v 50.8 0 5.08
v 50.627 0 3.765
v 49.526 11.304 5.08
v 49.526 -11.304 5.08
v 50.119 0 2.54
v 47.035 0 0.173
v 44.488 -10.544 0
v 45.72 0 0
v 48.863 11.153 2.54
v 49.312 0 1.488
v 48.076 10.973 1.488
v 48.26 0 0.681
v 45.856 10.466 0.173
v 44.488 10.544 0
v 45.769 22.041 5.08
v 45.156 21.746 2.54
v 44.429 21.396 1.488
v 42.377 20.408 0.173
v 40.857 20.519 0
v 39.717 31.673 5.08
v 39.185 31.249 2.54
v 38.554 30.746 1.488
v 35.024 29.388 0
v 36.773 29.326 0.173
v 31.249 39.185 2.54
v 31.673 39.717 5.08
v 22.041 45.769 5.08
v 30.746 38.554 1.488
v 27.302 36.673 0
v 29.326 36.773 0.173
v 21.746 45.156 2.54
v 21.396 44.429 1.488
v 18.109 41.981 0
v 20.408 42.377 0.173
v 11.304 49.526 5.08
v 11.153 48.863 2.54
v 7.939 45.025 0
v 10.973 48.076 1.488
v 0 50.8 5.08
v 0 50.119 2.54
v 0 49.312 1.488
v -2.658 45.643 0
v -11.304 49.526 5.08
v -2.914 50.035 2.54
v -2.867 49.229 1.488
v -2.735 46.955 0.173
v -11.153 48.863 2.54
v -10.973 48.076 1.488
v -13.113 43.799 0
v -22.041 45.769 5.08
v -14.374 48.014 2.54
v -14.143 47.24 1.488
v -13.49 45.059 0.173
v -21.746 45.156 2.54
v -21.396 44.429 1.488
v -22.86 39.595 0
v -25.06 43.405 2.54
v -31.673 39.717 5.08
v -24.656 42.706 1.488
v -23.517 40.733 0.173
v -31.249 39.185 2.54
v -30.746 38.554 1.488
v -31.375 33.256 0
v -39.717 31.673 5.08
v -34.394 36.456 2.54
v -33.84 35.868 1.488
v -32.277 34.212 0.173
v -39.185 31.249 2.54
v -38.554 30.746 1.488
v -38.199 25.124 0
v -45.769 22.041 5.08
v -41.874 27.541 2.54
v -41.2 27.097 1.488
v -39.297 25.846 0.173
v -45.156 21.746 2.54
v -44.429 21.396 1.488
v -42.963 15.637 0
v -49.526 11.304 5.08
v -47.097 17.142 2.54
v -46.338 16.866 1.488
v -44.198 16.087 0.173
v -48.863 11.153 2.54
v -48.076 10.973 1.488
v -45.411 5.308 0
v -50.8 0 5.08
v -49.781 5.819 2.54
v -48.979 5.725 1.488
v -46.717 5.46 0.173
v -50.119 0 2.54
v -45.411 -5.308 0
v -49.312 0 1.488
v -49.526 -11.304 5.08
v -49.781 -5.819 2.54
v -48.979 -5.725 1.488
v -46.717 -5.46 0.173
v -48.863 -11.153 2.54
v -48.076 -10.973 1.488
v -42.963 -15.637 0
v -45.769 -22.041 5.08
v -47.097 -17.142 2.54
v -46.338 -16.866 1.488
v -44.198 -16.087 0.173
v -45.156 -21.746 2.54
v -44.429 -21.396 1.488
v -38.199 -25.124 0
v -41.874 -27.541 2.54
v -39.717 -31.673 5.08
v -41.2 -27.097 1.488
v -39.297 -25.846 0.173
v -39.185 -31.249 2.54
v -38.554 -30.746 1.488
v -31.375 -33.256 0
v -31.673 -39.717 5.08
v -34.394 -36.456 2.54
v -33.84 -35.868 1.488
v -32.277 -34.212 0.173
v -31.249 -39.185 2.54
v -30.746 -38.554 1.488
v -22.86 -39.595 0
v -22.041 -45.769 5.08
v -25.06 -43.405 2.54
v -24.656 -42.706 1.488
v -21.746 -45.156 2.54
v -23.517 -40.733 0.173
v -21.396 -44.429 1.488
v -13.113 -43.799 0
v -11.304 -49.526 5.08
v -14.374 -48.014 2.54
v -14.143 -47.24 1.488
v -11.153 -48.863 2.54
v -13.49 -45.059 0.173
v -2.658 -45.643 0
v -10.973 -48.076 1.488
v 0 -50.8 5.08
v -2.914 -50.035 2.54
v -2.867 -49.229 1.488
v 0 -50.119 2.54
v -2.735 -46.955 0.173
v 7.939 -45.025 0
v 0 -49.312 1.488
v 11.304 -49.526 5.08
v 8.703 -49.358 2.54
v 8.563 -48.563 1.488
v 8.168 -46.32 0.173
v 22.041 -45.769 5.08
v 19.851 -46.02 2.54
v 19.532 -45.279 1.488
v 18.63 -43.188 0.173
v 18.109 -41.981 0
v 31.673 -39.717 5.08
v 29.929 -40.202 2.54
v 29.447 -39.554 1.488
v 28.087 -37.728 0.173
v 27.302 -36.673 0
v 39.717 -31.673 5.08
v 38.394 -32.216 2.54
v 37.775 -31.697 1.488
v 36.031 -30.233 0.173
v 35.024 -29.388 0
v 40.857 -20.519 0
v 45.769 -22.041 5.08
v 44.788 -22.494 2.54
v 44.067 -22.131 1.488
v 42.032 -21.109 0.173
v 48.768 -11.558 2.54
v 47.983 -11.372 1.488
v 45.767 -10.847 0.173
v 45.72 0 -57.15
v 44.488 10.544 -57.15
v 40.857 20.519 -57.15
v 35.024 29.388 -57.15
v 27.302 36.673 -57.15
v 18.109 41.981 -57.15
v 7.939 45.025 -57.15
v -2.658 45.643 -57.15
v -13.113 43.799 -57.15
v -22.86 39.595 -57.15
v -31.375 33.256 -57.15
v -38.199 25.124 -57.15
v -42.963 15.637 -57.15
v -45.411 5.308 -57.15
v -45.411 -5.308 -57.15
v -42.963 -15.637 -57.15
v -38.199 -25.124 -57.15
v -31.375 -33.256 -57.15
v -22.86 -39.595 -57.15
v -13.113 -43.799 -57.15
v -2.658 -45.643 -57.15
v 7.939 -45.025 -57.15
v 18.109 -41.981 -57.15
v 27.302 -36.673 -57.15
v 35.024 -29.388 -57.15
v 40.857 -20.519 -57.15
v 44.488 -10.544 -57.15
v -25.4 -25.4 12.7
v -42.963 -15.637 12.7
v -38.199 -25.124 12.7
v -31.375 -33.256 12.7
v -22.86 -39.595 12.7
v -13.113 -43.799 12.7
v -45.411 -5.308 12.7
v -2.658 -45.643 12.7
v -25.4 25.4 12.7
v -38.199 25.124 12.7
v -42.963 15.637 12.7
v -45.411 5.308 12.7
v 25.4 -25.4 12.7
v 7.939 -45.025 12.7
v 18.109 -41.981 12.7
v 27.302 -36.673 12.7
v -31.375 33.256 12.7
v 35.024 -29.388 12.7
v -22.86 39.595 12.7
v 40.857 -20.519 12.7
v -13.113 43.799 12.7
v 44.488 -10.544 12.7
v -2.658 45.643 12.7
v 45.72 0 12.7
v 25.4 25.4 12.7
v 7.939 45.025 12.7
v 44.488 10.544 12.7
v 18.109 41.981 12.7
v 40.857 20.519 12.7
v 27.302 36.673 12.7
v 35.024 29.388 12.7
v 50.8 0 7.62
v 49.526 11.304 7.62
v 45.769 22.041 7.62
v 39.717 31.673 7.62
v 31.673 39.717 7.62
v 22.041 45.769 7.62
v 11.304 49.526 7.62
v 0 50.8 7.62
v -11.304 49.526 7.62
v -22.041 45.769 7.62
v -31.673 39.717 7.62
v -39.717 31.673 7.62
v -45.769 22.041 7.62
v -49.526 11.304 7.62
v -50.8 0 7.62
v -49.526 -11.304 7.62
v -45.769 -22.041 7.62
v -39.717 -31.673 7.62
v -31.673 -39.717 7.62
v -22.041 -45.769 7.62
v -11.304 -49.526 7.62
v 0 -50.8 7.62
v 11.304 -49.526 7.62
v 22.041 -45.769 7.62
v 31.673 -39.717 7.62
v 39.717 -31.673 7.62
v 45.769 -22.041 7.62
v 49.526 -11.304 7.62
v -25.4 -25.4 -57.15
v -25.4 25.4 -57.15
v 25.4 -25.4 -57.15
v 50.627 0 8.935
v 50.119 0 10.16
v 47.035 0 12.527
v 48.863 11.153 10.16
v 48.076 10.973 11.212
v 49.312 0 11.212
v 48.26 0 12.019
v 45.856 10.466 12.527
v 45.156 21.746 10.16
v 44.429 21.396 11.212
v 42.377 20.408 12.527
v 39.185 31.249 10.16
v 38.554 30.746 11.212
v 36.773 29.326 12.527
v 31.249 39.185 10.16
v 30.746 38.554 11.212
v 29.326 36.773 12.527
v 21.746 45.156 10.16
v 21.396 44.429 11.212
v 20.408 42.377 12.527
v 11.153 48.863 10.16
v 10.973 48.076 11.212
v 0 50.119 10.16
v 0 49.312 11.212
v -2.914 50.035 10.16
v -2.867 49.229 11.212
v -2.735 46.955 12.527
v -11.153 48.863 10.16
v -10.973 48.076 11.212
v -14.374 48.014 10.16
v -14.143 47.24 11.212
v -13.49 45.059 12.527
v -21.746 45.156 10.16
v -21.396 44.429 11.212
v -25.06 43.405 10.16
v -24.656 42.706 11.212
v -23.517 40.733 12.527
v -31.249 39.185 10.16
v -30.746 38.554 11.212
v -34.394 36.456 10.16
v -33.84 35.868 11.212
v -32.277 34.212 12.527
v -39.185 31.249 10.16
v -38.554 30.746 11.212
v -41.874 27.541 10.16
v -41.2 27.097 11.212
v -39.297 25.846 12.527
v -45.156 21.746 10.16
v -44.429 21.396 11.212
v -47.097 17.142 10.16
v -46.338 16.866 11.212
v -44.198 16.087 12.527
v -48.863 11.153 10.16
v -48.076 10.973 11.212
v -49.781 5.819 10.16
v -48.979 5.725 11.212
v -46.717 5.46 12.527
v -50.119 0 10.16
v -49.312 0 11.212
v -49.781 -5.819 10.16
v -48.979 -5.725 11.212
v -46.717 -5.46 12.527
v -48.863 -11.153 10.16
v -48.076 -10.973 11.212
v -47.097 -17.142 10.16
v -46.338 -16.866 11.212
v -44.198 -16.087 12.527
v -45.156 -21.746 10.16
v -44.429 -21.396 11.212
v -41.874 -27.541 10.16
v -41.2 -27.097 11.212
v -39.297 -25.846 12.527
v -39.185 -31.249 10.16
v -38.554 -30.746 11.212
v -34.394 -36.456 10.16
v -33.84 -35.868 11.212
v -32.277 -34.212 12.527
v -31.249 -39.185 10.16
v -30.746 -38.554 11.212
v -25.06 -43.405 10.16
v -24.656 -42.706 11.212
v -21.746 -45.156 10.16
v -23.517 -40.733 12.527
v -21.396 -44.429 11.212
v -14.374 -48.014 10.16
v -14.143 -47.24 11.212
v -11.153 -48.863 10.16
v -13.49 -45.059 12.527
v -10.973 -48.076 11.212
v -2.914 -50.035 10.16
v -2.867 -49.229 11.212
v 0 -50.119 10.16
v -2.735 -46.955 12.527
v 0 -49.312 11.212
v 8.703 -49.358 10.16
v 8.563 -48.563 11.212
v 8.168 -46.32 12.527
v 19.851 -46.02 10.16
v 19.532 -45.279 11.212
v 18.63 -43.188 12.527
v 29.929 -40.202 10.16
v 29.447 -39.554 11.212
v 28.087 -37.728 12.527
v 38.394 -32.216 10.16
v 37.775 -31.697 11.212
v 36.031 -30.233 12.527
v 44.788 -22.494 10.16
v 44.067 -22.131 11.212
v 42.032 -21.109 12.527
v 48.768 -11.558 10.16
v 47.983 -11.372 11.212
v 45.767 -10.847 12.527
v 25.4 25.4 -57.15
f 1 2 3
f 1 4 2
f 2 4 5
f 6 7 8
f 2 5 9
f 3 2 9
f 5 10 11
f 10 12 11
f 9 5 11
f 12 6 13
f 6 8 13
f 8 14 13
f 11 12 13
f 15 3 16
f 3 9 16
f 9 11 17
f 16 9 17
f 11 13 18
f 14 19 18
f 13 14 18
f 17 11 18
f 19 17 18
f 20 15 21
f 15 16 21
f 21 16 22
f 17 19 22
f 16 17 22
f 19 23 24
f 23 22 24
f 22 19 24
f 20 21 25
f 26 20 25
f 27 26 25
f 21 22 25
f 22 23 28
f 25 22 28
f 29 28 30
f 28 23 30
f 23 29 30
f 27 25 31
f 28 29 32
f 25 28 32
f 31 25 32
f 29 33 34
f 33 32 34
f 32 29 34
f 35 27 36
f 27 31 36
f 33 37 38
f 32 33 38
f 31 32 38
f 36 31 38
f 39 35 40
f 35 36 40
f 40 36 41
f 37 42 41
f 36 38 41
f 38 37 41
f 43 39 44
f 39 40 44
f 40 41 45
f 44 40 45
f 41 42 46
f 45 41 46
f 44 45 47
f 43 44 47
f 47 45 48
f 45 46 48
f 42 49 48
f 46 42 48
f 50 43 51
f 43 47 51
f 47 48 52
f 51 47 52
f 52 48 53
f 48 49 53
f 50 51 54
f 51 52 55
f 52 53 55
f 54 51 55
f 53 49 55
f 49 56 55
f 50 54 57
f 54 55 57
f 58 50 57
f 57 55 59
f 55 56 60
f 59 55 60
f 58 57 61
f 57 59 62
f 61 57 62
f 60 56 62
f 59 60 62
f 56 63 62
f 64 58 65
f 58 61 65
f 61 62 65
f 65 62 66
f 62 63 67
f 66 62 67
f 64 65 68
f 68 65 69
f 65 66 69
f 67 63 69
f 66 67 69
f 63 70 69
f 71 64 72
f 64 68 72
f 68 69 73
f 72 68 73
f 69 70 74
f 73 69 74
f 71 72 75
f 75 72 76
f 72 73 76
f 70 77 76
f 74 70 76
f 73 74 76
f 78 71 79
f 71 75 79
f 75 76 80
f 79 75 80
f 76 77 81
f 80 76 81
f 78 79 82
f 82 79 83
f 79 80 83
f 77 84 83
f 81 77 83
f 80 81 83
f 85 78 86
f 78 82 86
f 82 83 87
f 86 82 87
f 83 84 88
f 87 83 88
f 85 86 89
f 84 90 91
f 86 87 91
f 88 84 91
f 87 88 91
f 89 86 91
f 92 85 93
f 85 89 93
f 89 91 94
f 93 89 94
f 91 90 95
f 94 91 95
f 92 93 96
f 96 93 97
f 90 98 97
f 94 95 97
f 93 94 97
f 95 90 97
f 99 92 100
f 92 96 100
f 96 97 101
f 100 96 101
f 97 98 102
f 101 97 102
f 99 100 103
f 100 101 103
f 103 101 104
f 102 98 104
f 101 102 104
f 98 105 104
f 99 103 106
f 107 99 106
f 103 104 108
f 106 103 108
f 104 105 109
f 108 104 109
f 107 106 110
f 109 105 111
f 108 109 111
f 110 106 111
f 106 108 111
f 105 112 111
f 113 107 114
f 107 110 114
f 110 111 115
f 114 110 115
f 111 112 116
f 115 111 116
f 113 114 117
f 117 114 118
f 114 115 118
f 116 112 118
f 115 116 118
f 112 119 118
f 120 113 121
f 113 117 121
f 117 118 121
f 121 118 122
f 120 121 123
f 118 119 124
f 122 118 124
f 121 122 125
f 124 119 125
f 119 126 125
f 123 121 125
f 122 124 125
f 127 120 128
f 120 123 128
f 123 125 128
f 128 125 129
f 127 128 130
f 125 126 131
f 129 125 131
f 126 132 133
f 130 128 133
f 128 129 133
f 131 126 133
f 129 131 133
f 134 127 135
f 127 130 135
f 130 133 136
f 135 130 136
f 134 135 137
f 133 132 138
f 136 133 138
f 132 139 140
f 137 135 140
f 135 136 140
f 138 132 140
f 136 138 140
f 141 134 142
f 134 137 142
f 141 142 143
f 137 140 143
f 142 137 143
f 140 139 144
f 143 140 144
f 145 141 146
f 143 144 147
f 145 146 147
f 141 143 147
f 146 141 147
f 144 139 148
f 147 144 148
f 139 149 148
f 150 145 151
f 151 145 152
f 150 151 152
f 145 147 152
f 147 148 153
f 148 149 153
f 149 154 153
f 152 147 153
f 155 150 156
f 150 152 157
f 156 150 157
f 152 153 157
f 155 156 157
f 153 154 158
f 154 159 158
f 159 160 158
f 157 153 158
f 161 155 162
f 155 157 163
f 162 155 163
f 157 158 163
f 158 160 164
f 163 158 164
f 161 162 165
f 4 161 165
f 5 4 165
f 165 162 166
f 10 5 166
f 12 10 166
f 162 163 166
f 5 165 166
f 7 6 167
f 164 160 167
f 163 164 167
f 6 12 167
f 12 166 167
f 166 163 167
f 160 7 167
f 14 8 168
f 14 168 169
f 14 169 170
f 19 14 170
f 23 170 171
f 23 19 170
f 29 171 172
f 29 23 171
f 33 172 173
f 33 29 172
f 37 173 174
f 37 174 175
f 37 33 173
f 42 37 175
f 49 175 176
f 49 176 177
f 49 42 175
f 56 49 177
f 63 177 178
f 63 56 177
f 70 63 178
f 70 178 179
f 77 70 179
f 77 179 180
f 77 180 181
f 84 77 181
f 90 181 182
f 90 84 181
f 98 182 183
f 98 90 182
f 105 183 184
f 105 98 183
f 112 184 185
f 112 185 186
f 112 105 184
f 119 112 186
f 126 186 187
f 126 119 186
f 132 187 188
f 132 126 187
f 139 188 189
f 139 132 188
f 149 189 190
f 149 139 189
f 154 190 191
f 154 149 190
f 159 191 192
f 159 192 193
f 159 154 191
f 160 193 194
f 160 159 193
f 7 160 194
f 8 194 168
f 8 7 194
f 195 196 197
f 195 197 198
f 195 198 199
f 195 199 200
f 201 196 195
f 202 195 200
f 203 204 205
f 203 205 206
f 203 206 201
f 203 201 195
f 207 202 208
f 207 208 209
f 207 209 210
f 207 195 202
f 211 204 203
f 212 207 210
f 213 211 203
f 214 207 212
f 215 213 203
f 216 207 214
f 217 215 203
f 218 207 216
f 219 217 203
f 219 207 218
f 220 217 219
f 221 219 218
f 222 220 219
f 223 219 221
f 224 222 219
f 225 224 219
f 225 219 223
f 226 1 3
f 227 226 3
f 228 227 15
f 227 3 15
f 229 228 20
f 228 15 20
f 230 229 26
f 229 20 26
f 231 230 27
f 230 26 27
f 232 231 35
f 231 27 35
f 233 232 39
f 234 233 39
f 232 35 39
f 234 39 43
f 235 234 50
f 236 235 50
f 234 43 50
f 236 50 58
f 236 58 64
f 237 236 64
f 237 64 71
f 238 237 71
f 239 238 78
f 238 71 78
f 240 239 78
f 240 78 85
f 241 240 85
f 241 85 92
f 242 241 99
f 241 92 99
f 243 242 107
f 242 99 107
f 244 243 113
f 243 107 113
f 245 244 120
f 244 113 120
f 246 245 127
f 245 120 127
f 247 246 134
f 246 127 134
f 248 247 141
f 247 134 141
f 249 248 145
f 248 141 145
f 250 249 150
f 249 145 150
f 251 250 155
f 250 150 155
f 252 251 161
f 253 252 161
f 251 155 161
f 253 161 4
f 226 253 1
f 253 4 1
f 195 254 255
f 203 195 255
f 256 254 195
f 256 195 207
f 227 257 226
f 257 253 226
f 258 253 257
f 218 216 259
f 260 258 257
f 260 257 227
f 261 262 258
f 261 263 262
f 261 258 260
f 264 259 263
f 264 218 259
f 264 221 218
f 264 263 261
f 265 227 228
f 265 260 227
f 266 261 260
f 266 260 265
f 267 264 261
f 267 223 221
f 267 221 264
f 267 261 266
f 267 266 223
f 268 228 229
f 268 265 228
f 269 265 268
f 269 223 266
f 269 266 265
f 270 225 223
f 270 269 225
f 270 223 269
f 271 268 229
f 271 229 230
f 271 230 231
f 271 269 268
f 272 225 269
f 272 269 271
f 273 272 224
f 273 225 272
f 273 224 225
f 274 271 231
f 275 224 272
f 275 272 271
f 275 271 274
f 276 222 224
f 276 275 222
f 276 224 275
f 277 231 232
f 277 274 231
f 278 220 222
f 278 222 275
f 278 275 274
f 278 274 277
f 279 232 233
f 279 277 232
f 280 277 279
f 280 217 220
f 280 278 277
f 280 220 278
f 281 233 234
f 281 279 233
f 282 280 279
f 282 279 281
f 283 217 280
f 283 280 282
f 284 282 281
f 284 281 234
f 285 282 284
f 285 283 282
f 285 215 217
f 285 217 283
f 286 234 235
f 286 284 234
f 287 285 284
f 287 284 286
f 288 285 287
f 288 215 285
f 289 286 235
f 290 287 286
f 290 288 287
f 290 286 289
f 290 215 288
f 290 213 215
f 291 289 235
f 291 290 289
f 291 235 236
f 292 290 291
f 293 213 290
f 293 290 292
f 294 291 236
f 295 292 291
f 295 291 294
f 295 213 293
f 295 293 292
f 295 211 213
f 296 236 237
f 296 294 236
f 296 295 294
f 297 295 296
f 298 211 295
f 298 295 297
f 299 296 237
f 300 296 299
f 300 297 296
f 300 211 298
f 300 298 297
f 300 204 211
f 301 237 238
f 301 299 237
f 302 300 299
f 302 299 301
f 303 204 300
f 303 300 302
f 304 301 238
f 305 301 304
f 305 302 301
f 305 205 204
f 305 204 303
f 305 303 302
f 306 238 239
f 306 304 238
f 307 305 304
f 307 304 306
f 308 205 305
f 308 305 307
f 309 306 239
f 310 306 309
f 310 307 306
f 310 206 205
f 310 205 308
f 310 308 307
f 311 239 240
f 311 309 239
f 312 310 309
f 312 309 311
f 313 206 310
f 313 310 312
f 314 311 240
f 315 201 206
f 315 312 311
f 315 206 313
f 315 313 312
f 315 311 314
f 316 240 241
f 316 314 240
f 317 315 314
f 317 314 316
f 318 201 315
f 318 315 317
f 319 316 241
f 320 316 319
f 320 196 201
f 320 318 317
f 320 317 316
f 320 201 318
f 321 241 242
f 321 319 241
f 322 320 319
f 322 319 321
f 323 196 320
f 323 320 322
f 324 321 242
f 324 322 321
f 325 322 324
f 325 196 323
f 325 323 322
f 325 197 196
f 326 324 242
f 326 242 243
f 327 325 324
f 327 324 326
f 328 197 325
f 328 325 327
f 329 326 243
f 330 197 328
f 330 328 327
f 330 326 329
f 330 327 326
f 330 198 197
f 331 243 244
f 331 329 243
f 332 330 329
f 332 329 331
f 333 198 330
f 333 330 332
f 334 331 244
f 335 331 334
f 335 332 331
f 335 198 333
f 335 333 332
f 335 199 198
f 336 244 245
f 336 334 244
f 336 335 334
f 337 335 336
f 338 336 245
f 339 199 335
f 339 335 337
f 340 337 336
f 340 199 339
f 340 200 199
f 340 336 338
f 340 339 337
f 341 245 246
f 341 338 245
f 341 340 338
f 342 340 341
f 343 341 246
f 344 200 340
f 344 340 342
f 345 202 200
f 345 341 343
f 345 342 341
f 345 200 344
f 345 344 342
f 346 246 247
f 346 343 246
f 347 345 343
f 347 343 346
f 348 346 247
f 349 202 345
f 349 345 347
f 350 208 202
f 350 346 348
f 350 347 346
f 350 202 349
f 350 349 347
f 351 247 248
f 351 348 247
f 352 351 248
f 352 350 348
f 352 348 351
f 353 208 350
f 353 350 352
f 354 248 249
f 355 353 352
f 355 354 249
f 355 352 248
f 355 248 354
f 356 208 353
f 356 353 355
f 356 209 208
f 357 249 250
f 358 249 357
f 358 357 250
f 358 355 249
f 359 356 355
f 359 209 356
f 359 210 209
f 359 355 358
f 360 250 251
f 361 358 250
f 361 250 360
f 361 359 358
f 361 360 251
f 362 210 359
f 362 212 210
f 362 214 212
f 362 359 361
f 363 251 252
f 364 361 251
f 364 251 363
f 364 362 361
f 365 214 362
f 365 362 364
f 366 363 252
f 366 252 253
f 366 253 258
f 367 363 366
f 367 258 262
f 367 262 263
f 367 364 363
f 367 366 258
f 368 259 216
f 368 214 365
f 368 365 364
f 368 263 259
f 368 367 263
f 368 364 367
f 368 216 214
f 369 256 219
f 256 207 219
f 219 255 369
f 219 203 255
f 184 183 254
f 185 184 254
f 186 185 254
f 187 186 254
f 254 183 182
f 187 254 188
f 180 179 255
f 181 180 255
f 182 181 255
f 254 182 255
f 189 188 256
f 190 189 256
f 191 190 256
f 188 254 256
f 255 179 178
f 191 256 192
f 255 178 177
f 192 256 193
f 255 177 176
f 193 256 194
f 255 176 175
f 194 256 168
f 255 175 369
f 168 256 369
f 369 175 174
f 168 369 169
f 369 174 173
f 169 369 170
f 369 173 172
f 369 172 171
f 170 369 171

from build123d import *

# Parameters (mm, degrees)
F0_R     = 50.8
F0_W     = 50.8
F0_H     = 50.8
F1_DEPTH = 12.7
F2_R     = 5.08
F3_DEPTH = 57.15


with BuildPart() as f1:
    # F0 (on Top) → F1 (new body)
    with BuildSketch(Plane.XY):
        Circle(F0_R)
        Rectangle(F0_W, F0_H, mode=Mode.SUBTRACT)
    extrude(amount=F1_DEPTH)

    # F2
    f2_edges = [f1.edges().sort_by_distance(p)[0] for p in [
        (50.8, 0, 6.35),
        (-50.8, 0, 0),
        (-50.8, 0, 12.7),
    ]]
    fillet(f2_edges, radius=F2_R)

    # F3 (add): a face of the model
    f3_faces = [f1.faces().sort_by_distance(p)[0] for p in [
        (-44.4268431186, 0, 0),
    ]]
    extrude(f3_faces, amount=F3_DEPTH)


solid = f1.part
